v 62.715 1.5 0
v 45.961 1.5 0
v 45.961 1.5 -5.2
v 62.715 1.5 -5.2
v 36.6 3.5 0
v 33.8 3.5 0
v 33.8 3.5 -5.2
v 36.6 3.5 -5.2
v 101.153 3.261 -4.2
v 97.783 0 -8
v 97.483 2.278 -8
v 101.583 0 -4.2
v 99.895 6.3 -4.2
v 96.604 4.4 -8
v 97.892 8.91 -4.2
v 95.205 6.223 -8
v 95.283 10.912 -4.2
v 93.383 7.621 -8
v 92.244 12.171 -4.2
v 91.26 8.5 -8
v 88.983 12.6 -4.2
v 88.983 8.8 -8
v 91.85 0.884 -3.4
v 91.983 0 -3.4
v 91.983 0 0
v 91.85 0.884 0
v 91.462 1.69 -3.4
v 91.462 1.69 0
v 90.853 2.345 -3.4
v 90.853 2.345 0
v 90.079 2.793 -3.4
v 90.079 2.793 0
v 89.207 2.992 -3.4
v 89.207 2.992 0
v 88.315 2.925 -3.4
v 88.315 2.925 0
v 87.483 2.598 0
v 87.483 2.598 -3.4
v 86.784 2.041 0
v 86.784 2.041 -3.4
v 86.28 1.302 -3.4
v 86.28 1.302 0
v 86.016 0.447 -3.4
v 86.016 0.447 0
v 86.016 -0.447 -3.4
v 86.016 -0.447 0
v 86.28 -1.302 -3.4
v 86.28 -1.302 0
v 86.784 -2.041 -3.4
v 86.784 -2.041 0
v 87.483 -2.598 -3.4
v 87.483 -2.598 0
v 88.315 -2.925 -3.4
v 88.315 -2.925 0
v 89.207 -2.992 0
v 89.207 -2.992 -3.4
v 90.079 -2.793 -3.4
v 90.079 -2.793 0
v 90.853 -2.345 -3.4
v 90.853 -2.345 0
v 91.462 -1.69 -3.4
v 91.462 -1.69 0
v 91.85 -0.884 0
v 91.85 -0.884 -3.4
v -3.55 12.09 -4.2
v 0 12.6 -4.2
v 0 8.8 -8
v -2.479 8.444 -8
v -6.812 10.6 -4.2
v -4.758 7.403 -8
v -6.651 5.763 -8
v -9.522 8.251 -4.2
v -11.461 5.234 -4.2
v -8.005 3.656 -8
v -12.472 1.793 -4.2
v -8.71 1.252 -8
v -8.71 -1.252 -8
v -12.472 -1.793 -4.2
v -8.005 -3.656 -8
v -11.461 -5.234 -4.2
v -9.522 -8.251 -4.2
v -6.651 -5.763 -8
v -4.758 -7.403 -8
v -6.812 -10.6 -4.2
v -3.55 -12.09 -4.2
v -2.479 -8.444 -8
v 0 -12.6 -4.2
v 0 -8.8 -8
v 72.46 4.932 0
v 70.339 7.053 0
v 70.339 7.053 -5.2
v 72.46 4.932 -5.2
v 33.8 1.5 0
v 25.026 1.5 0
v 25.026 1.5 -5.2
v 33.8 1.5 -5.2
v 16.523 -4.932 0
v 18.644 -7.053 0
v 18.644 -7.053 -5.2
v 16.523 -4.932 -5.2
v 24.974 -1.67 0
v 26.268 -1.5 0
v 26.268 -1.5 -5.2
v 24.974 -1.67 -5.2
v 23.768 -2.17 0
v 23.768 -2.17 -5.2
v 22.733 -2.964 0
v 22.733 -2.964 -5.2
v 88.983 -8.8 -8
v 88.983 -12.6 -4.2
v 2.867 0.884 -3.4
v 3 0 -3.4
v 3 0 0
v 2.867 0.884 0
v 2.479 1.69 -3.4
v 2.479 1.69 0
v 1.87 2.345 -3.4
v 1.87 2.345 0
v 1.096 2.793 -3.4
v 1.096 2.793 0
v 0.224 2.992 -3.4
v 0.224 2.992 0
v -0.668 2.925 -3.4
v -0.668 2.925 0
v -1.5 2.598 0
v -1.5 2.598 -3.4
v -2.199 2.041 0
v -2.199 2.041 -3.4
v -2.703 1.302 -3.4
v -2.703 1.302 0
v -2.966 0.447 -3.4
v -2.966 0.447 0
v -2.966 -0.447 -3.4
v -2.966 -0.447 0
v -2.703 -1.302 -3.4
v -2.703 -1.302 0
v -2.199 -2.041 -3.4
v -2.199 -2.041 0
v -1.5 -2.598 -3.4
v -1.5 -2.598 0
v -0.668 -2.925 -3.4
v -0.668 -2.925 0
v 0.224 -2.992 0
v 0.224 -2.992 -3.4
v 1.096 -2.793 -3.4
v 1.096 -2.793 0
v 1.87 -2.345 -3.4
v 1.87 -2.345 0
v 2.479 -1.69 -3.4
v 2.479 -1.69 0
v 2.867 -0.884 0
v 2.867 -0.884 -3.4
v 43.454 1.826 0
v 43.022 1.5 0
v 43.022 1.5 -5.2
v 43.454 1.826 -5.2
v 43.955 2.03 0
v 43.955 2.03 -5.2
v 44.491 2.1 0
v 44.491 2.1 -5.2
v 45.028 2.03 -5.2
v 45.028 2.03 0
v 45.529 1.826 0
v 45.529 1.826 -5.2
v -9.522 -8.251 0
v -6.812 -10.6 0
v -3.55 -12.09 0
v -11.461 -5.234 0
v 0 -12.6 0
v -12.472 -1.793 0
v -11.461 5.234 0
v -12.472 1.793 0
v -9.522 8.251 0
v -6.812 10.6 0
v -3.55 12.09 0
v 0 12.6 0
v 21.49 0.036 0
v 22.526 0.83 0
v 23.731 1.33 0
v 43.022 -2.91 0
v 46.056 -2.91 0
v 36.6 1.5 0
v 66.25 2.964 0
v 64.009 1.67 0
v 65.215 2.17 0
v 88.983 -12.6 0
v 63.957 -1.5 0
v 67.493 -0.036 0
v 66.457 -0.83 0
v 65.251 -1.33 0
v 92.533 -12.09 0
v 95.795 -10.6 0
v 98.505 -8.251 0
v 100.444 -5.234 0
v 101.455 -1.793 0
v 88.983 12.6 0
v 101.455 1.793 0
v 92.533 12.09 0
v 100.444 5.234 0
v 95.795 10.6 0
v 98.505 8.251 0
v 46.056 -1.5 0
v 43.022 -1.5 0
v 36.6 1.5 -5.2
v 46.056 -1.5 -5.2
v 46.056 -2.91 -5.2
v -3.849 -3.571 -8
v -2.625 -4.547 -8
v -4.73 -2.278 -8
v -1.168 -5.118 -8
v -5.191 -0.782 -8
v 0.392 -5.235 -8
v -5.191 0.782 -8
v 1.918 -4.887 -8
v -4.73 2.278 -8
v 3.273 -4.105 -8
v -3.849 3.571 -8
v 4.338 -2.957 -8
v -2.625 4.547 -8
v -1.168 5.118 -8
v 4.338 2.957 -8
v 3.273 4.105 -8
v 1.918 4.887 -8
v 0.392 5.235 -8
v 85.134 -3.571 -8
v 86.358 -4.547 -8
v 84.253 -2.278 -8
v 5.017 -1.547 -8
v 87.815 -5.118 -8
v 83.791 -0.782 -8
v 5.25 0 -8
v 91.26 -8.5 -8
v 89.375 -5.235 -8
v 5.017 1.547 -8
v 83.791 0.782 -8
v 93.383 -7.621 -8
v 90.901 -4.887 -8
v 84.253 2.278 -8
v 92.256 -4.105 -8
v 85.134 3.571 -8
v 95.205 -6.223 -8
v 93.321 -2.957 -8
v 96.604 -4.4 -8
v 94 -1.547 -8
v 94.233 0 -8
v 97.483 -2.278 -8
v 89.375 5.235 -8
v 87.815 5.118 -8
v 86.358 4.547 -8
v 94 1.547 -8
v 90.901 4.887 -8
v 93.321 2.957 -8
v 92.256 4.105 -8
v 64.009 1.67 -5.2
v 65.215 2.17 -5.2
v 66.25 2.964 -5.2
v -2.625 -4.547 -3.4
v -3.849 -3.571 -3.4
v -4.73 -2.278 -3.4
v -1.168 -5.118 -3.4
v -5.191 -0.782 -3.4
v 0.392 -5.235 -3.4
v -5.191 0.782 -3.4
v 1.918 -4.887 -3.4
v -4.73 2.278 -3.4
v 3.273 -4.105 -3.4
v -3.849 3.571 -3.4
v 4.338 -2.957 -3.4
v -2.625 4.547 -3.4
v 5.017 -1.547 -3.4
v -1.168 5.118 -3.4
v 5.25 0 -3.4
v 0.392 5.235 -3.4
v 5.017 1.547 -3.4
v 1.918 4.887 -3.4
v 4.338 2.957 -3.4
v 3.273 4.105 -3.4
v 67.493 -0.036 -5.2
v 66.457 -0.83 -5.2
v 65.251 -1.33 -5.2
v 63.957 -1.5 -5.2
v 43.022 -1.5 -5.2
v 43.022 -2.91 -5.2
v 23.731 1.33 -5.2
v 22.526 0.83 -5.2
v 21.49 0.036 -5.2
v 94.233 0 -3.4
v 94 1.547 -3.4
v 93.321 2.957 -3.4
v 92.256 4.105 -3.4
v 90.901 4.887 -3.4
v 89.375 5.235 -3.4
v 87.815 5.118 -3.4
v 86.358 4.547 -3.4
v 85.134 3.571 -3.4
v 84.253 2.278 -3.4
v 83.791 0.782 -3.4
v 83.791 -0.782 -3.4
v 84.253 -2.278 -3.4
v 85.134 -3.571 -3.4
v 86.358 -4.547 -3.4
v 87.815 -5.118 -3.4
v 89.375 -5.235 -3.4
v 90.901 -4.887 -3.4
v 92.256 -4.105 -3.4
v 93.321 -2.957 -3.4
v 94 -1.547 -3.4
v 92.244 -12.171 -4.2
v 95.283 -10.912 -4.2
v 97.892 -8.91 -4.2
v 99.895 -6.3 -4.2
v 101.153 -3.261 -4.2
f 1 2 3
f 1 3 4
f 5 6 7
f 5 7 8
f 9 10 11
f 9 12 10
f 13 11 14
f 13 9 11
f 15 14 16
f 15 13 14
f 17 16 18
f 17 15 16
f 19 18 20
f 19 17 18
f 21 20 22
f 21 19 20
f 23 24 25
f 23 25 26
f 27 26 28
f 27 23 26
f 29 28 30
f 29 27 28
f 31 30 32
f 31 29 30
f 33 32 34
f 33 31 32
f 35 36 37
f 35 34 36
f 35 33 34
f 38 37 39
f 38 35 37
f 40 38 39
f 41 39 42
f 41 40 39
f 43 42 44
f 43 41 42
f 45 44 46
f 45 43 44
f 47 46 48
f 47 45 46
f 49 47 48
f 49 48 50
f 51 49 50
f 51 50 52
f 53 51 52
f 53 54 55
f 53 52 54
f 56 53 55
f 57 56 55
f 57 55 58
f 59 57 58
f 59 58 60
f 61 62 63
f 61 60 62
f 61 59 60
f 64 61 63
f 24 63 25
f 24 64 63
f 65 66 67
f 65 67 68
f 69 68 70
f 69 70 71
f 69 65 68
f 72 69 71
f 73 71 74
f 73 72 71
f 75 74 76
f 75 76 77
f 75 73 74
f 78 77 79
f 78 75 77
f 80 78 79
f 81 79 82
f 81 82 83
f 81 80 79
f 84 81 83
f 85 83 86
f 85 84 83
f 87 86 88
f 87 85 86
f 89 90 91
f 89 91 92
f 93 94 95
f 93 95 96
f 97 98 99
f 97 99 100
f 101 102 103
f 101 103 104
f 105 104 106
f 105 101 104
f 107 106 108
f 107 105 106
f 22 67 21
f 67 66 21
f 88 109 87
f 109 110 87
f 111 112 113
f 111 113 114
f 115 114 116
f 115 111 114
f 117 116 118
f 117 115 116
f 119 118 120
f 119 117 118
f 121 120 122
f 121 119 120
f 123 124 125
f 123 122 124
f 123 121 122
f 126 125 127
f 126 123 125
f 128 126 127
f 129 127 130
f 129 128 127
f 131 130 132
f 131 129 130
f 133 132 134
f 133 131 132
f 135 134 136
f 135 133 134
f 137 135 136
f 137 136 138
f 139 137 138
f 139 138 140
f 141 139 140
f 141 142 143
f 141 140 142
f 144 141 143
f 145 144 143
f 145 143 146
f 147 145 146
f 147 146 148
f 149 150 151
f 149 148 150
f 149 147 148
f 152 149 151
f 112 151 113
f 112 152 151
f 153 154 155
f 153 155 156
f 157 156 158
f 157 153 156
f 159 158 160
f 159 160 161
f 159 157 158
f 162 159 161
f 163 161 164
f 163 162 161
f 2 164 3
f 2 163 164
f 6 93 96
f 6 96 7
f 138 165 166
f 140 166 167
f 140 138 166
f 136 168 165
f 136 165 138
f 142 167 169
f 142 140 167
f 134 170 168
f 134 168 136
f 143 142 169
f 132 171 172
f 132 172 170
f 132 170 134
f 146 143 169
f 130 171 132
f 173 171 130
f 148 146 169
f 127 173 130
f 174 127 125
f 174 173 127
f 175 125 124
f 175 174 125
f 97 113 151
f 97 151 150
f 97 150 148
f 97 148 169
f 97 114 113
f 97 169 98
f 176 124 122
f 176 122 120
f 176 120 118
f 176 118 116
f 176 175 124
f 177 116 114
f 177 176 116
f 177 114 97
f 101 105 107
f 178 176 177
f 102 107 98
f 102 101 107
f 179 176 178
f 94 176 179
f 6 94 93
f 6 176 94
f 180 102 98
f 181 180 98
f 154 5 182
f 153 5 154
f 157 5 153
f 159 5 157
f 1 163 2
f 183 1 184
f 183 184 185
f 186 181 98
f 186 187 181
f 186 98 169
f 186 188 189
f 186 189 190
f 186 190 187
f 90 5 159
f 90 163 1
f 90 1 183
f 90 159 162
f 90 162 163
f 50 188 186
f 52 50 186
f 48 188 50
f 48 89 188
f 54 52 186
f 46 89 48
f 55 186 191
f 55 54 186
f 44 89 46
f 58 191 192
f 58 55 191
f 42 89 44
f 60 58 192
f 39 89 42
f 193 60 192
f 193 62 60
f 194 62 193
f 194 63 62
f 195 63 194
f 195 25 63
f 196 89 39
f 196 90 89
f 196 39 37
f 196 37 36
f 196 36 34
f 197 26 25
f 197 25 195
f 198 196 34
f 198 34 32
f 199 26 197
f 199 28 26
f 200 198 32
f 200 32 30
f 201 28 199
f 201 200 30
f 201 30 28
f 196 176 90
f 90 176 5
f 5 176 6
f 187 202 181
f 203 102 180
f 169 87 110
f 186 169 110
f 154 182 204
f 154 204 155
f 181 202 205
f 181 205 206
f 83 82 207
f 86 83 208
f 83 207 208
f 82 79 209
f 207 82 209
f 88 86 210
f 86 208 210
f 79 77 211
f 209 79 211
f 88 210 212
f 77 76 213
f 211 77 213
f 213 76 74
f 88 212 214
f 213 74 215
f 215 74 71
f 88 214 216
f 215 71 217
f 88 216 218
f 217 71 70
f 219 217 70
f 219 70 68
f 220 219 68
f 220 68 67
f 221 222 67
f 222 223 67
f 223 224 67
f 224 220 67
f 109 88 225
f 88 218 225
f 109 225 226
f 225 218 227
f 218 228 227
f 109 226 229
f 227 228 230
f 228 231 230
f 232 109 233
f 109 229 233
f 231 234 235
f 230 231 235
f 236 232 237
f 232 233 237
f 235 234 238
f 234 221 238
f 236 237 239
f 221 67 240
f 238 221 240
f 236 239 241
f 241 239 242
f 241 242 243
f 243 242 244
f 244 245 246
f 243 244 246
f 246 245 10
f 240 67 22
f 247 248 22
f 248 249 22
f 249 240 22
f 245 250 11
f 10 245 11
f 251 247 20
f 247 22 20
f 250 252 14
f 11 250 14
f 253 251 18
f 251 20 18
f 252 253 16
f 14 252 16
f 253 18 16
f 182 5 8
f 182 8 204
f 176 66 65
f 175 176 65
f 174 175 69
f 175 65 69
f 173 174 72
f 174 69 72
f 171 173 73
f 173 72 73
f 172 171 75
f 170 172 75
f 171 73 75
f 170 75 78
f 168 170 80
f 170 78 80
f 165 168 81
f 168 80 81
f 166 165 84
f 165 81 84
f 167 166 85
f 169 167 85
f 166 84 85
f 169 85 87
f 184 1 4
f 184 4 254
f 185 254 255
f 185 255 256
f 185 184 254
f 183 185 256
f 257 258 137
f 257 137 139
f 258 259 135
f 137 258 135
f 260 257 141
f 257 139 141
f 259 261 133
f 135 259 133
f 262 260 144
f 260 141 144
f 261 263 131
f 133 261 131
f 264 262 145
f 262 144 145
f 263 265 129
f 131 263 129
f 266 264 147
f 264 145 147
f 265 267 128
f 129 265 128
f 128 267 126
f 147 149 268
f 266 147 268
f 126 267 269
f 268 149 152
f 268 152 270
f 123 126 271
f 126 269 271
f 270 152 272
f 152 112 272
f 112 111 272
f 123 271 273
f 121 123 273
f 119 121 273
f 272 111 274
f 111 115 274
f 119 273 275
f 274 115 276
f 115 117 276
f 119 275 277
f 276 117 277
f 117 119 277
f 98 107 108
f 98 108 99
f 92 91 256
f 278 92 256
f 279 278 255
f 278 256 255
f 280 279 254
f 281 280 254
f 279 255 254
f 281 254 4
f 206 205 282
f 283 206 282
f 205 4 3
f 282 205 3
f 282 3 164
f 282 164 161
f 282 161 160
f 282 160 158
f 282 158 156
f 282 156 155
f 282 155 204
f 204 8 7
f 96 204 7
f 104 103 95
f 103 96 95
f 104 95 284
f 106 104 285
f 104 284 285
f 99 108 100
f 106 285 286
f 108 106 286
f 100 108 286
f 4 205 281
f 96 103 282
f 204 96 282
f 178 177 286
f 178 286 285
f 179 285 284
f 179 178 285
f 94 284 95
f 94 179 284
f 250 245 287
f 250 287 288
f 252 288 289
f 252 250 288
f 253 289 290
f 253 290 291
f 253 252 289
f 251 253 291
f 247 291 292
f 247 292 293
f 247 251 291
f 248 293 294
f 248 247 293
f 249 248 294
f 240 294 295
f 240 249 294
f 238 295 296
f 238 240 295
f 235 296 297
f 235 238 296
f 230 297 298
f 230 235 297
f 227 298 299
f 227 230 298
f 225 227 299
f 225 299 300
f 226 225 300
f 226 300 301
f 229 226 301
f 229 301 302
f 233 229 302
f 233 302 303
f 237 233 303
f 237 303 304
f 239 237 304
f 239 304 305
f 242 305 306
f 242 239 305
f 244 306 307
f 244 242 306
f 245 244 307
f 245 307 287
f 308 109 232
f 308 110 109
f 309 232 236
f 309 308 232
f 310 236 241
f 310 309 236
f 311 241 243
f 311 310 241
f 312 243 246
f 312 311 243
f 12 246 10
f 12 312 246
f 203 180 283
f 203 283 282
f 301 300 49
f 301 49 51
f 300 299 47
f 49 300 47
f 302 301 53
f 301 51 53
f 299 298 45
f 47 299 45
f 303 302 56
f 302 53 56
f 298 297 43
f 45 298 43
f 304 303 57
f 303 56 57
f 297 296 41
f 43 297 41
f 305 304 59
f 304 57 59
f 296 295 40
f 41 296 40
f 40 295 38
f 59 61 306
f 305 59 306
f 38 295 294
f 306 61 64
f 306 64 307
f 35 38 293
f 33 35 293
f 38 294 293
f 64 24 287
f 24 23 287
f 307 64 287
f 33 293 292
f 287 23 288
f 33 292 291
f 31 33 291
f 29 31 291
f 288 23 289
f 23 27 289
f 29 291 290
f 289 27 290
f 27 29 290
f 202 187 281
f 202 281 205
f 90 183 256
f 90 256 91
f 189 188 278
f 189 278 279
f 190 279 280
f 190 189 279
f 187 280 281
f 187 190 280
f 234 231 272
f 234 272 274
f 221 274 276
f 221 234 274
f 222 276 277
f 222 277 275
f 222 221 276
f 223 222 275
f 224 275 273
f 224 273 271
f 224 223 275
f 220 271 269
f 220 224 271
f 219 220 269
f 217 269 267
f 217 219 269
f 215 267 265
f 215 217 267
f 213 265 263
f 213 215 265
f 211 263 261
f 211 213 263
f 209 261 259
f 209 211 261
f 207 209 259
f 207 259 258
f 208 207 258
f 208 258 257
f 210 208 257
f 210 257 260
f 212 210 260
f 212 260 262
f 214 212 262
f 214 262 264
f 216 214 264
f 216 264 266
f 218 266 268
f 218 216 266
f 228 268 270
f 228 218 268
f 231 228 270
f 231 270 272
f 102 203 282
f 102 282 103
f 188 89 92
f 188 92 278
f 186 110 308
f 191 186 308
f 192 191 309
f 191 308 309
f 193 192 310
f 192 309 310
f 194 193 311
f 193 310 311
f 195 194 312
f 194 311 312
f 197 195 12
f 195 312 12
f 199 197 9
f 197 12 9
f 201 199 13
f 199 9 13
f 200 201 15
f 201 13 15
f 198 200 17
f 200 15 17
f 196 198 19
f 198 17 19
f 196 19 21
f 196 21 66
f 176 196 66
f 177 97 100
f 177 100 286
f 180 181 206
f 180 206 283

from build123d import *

# Parameters (mm, degrees)
BOSS_EXTRUDE1_DEPTH  = 4.5
BOSS_EXTRUDE2_DEPTH  = 4
CHAMFER2_START       = -4.2
CHAMFER2_2_DEPTH     = 4.2
CHAMFER2_START_2     = -8
CHAMFER2_3_OUTLINE_R = 8.8
CHAMFER2_3_DEPTH     = 3.8
SKETCH7_R            = 3
CUT_EXTRUDE3_DEPTH   = 103.673405561
SKETCH8_R            = 5.25
CUT_EXTRUDE4_DEPTH   = 4.6
CUT_EXTRUDE5_DEPTH   = 5.2


with BuildPart() as part:
    # Sketch1 → Boss-Extrude1 (new body)
    with BuildSketch(Plane.XY):
        with BuildLine():
            Line((0, 12.6), (88.982814426, 12.6))
            ThreePointArc((88.982814426, 12.6), (101.582814426, 0), (88.982814426, -12.6))
            Line((88.982814426, -12.6), (0, -12.6))
            ThreePointArc((0, -12.6), (-12.6, 0), (0, 12.6))
        make_face()
    extrude(amount=-BOSS_EXTRUDE1_DEPTH)

    # Sketch2 → Boss-Extrude2 (add)
    with BuildSketch(Plane.XY.offset(-8)):
        with BuildLine():
            Line((89.741407213, 8.85), (-0.758592787, 8.85))
            ThreePointArc((-0.758592787, 8.85), (-9.608592787, 0), (-0.758592787, -8.85))
            Line((-0.758592787, -8.85), (89.741407213, -8.85))
            ThreePointArc((89.741407213, -8.85), (98.591407213, 0), (89.741407213, 8.85))
        make_face()
    extrude(amount=BOSS_EXTRUDE2_DEPTH)

    # Chamfer2: read off the stored shape, not the designer's step
    # Chamfer2 outline → Chamfer2 (revolve)
    with BuildSketch(Plane.XZ):
        Polygon((8.8, -4.2), (8.8, -8), (12.6, -4.2), align=None)
    revolve(axis=Axis((0, 0, 0), (0, 0, 1)))

    # Chamfer2 2 outline → Chamfer2 2 (add)
    with BuildSketch(Plane.XY.offset(CHAMFER2_START)):
        with BuildLine():
            Line((88.982814426, 12.6), (0, 12.6))
            ThreePointArc((0, 12.6), (-12.6, 0), (0, -12.6))
            Line((0, -12.6), (88.982814426, -12.6))
            ThreePointArc((88.982814426, -12.6), (101.582814426, 0), (88.982814426, 12.6))
        make_face()
    extrude(amount=CHAMFER2_2_DEPTH)

    # Chamfer2 3 outline → Chamfer2 3 (add)
    with BuildSketch(Plane.XY.offset(CHAMFER2_START_2)):
        Circle(CHAMFER2_3_OUTLINE_R)
    extrude(amount=CHAMFER2_3_DEPTH)

    # Chamfer2 4: loft between two sections, ruled curve by curve
    chamfer2_4_from = [
        Edge.make_three_point_arc((88.982814426, -8.8, -8), (95.205354101, -6.222539674, -8), (97.782814426, 0, -8)),
        Edge.make_three_point_arc((97.782814426, 0, -8), (95.205354101, 6.222539674, -8), (88.982814426, 8.8, -8)),
        Edge.make_line((0, 8.8, -8), (88.982814426, 8.8, -8)),
        Edge.make_line((88.982814426, -8.8, -8), (0, -8.8, -8)),
        Edge.make_line((0, -8.8, -8), (0, 8.8, -8)),
    ]
    chamfer2_4_to = [
        Edge.make_three_point_arc((88.982814426, -12.6, -4.2), (97.892359869, -8.909545443, -4.2), (101.582814426, 0, -4.2)),
        Edge.make_three_point_arc((101.582814426, 0, -4.2), (97.892359869, 8.909545443, -4.2), (88.982814426, 12.6, -4.2)),
        Edge.make_line((0, 12.6, -4.2), (88.982814426, 12.6, -4.2)),
        Edge.make_line((88.982814426, -12.6, -4.2), (0, -12.6, -4.2)),
        Edge.make_line((0, -12.6, -4.2), (0, 12.6, -4.2)),
    ]
    chamfer2_4 = Solid(Shell([*[Face.make_surface_from_curves(chamfer2_4_from[k], chamfer2_4_to[k]) for k in range(5)], Face(Wire(chamfer2_4_from)), Face(Wire(chamfer2_4_to))]))
    add(chamfer2_4)

    # Sketch7 → Cut-Extrude3 (cut, through all)
    with BuildSketch(Plane.XY.offset(-8)):
        Circle(SKETCH7_R)
        with Locations((88.982814426, 0)):
            Circle(SKETCH7_R)
    extrude(amount=CUT_EXTRUDE3_DEPTH, mode=Mode.SUBTRACT)

    # Sketch8 → Cut-Extrude4 (cut)
    with BuildSketch(Plane.XY.offset(-8)):
        Circle(SKETCH8_R)
        with Locations((88.982814426, 0)):
            Circle(SKETCH8_R)
    extrude(amount=CUT_EXTRUDE4_DEPTH, mode=Mode.SUBTRACT)

    # Sketch9 → Cut-Extrude5 (cut)
    with BuildSketch(Plane.XY):
        with BuildLine():
            Line((22.732649866, -2.964466094), (18.644187371, -7.052928589))
            Line((18.644187371, -7.052928589), (16.522867028, -4.931608246))
            Line((16.522867028, -4.931608246), (21.490009179, 0.035533906))
            ThreePointArc((21.490009179, 0.035533906), (23.112125923, 1.119397663), (25.025543085, 1.5))
            Line((25.025543085, 1.5), (33.8, 1.5))
            Line((33.8, 1.5), (33.8, 3.5))
            Line((33.8, 3.5), (36.6, 3.5))
            Line((36.6, 3.5), (36.6, 1.5))
            Line((36.6, 1.5), (43.021713367, 1.5))
            ThreePointArc((43.021713367, 1.5), (44.491407213, 2.1), (45.961101059, 1.5))
            Line((45.961101059, 1.5), (62.714630654, 1.5))
            ThreePointArc((62.714630654, 1.5), (64.628047816, 1.880602337), (66.25016456, 2.964466094))
            Line((66.25016456, 2.964466094), (70.338627055, 7.052928589))
            Line((70.338627055, 7.052928589), (72.459947399, 4.931608246))
            Line((72.459947399, 4.931608246), (67.492805247, -0.035533906))
            ThreePointArc((67.492805247, -0.035533906), (65.870688503, -1.119397663), (63.957271341, -1.5))
            Line((63.957271341, -1.5), (46.05578497, -1.5))
            Line((46.05578497, -1.5), (46.05578497, -2.91))
            Line((46.05578497, -2.91), (43.021713367, -2.91))
            Line((43.021713367, -2.91), (43.021713367, -1.5))
            Line((43.021713367, -1.5), (26.268183772, -1.5))
            ThreePointArc((26.268183772, -1.5), (24.35476661, -1.880602337), (22.732649866, -2.964466094))
        make_face()
    extrude(amount=-CUT_EXTRUDE5_DEPTH, mode=Mode.SUBTRACT)


solid = part.part
